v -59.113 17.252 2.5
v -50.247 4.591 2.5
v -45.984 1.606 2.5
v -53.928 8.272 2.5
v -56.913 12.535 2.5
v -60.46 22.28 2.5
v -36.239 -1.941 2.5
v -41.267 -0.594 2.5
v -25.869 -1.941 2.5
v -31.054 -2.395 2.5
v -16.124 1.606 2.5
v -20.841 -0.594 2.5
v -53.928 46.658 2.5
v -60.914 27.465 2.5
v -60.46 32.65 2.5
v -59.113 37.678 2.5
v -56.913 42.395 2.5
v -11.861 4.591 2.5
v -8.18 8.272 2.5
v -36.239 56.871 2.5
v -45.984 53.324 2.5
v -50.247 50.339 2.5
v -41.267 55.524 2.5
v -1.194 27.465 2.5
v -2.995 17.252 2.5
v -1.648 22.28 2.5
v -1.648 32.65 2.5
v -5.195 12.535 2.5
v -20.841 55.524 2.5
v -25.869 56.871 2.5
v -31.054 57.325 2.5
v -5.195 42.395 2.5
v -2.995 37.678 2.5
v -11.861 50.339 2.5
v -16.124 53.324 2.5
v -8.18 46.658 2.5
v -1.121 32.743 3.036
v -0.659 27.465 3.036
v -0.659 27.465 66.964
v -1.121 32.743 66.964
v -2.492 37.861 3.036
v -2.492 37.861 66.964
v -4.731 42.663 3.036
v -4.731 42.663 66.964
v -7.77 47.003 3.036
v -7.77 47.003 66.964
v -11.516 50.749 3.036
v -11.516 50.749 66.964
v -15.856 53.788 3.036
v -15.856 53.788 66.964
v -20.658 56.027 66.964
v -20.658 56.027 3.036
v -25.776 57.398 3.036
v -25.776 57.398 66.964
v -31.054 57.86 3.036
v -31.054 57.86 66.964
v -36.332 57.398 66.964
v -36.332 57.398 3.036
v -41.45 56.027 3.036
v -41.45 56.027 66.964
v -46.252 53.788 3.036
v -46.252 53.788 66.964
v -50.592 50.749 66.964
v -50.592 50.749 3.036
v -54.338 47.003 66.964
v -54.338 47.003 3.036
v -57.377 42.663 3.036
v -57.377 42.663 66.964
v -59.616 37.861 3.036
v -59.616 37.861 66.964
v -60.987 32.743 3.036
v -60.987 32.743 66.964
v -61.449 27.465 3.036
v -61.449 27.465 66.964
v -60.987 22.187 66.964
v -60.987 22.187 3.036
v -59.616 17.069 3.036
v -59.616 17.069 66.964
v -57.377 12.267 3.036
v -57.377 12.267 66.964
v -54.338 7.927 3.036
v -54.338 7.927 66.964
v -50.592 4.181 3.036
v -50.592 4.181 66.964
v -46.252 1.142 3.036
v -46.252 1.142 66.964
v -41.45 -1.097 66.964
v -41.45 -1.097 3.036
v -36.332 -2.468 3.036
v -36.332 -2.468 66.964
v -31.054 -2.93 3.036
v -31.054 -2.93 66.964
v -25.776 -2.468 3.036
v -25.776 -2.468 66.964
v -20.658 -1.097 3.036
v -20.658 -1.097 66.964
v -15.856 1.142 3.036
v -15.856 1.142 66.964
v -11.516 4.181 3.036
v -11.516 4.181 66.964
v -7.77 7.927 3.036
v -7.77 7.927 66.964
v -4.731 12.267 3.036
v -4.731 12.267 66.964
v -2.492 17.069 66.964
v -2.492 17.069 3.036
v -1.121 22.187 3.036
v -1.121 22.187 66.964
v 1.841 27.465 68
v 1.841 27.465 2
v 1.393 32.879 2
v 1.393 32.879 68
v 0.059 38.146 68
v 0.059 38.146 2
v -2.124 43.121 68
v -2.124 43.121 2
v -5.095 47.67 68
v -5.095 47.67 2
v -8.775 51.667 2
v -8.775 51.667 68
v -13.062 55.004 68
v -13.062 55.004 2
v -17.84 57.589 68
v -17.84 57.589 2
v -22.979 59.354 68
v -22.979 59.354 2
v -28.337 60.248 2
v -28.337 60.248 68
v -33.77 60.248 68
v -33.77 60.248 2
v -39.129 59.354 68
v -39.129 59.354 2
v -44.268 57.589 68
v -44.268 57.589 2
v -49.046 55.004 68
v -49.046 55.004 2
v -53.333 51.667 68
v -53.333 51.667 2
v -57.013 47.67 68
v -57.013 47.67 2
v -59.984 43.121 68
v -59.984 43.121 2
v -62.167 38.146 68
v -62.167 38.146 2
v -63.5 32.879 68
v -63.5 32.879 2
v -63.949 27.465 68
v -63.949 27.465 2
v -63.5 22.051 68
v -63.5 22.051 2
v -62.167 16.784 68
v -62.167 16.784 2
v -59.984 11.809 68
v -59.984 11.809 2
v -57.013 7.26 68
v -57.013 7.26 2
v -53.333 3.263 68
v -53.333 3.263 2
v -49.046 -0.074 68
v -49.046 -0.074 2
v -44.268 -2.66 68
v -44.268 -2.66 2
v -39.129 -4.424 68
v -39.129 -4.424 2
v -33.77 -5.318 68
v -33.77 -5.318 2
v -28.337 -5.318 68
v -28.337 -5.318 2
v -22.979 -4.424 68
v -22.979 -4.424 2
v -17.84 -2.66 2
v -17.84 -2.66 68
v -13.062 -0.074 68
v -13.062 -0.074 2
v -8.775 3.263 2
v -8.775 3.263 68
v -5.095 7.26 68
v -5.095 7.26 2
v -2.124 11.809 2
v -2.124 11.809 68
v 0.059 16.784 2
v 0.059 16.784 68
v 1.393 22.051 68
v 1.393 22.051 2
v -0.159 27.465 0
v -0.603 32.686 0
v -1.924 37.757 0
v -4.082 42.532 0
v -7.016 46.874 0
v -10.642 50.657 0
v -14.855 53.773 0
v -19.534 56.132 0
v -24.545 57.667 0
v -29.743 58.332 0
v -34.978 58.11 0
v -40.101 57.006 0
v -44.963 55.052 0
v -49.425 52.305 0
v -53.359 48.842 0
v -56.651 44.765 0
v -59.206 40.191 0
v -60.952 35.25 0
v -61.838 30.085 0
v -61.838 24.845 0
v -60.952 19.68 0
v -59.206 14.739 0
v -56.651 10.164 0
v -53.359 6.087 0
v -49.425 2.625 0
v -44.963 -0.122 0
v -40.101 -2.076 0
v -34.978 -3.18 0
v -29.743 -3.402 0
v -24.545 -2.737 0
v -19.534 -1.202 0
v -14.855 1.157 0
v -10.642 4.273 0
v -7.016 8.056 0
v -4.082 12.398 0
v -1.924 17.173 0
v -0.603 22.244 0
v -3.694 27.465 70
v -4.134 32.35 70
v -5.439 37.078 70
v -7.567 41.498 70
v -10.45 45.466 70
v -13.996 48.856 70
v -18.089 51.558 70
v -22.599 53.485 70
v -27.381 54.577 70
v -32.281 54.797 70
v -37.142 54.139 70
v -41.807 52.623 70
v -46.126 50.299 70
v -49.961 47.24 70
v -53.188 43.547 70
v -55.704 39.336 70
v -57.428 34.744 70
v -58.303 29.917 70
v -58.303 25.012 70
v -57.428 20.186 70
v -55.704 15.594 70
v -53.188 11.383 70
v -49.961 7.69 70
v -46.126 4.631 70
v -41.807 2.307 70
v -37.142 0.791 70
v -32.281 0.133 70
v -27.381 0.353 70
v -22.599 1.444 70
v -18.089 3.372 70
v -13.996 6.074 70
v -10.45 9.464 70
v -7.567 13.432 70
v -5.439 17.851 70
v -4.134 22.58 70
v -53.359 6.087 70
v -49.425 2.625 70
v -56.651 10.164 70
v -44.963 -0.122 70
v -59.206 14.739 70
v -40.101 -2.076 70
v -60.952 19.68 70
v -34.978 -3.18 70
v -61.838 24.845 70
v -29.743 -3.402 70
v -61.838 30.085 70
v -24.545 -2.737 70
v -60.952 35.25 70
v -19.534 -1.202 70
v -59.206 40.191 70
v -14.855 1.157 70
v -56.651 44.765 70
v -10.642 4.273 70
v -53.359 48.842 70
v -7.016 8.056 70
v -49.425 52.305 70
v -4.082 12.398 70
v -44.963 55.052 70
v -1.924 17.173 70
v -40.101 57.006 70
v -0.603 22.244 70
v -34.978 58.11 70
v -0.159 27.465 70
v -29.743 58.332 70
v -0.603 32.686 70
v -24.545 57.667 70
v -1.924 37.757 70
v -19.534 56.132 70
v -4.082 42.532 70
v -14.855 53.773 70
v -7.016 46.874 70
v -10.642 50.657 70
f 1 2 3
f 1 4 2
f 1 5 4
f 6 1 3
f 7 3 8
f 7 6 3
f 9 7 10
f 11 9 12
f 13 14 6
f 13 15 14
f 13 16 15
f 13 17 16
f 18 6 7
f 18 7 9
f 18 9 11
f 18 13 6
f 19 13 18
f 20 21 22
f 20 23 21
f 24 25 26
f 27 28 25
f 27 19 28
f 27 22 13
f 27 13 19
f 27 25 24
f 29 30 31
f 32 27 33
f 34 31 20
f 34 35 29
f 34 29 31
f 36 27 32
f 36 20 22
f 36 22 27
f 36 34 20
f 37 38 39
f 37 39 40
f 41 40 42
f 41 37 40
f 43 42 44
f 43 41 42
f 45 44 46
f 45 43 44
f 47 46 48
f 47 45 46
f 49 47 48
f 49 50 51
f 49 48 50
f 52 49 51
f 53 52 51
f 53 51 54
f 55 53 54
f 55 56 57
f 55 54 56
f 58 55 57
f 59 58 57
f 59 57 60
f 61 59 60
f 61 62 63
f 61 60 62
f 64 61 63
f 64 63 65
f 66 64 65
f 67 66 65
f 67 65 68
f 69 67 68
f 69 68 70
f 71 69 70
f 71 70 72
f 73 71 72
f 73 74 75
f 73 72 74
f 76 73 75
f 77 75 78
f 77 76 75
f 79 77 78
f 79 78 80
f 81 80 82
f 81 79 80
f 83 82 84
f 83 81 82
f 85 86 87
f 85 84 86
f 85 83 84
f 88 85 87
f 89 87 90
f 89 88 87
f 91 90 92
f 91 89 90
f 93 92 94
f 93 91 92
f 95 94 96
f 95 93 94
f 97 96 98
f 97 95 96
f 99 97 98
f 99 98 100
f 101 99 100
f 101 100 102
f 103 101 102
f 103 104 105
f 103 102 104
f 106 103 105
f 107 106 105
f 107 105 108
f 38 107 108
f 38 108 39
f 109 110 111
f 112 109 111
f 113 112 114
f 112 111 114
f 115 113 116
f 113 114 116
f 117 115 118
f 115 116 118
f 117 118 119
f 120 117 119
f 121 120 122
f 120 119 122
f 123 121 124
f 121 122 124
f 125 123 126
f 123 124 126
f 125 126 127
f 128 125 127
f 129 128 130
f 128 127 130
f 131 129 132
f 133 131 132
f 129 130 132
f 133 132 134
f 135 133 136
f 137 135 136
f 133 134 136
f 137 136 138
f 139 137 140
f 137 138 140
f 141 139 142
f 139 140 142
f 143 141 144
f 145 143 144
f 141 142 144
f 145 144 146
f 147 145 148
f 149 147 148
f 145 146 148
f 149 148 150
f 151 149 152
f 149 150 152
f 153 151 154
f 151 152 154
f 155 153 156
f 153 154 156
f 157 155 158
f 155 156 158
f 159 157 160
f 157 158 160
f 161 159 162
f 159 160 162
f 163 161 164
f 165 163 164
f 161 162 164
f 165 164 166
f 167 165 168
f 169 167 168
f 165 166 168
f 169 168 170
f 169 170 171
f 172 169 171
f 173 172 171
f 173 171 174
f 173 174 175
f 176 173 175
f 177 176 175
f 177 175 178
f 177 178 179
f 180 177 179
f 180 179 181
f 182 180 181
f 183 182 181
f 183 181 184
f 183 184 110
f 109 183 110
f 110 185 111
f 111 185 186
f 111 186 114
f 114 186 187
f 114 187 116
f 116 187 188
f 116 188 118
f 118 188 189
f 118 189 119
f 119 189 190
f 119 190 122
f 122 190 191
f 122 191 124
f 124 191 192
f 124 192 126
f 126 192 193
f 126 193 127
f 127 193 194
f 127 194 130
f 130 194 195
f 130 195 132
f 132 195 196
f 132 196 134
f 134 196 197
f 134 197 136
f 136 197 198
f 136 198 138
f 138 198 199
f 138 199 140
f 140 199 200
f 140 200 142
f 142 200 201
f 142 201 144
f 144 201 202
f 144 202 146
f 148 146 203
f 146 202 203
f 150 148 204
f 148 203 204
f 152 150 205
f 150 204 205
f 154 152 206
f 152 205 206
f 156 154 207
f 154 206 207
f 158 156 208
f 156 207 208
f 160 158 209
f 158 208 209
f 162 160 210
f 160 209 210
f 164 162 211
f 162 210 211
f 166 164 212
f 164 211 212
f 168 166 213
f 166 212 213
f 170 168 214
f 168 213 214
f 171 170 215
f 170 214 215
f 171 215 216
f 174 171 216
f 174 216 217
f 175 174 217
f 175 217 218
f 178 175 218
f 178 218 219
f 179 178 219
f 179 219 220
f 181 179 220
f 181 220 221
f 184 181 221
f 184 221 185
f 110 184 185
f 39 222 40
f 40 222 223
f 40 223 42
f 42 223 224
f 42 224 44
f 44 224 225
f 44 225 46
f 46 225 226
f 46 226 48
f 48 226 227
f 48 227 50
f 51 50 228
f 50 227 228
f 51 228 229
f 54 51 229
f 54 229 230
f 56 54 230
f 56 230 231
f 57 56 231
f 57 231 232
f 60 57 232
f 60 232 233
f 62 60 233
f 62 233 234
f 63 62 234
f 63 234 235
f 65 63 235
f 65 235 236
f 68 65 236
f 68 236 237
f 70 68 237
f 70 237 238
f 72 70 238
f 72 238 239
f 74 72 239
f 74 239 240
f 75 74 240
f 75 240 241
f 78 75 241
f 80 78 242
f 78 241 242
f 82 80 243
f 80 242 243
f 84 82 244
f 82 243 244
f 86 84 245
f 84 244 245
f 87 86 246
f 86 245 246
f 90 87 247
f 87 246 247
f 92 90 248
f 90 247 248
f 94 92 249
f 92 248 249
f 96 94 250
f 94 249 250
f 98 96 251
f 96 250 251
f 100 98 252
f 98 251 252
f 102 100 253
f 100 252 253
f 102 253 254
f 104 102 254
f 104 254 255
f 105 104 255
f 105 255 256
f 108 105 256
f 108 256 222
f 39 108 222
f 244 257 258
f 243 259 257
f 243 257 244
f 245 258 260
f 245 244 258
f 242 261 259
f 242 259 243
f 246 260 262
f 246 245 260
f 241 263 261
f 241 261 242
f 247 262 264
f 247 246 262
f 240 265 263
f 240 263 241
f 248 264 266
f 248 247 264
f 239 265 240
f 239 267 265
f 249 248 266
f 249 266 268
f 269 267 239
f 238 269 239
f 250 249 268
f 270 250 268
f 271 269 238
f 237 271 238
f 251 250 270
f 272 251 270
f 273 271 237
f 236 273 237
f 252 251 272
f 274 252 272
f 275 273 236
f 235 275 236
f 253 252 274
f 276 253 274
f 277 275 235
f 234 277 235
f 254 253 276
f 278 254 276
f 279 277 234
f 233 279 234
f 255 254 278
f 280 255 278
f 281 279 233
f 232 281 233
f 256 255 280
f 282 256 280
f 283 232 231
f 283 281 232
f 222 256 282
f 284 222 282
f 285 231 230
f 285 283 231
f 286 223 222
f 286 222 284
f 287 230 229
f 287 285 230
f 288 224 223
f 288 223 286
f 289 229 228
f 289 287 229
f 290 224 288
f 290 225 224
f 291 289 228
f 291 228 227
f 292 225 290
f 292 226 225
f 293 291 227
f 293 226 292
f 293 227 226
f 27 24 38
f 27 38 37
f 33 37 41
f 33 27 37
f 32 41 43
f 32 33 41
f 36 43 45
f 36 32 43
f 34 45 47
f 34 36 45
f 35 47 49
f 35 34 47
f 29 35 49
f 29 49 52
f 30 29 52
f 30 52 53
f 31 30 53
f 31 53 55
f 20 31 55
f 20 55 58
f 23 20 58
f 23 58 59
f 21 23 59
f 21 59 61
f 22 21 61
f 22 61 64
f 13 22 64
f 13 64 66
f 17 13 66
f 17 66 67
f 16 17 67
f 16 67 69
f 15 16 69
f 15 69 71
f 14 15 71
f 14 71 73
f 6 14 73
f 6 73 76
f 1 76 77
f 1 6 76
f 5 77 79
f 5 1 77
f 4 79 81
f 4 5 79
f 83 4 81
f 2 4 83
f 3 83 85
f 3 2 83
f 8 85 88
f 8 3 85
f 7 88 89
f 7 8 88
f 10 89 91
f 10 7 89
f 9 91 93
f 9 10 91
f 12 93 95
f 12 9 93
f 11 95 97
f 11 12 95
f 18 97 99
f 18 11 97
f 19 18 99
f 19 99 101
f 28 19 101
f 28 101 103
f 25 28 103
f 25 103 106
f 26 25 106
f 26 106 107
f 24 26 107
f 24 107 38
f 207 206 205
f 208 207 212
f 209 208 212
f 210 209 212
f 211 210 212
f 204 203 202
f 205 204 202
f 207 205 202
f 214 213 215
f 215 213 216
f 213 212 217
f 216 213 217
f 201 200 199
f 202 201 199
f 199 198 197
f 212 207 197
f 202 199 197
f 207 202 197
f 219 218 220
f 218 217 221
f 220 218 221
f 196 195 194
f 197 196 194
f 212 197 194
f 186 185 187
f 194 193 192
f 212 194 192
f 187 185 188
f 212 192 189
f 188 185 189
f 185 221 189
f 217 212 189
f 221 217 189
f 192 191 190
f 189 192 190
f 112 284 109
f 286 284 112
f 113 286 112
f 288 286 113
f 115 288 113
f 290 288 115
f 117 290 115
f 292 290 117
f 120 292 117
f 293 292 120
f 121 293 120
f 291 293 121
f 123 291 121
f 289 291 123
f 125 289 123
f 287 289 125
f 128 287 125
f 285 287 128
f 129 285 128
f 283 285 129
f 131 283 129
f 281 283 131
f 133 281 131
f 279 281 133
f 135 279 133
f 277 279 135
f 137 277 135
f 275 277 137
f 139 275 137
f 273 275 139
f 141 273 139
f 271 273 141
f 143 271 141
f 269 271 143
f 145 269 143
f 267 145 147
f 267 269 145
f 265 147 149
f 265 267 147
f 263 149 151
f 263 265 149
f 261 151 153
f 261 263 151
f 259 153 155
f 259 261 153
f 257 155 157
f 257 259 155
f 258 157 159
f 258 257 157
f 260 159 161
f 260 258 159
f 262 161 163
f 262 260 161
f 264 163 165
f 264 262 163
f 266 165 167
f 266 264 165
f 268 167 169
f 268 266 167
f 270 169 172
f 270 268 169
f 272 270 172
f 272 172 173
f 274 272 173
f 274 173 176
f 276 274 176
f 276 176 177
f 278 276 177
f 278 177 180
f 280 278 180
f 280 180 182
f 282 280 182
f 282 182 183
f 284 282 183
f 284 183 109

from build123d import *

# Parameters (mm, degrees)
F0_R     = 32.895129
F1_DEPTH = 70
F2_SIZE  = 2
F3_SIZE  = 2
F4_T     = -2.5


with BuildPart() as f1:
    # F0 (on Top) → F1 (new body)
    with BuildSketch(Plane.XY):
        with Locations((-31.053945, 27.464956)):
            Circle(F0_R)
    extrude(amount=F1_DEPTH)

    # F2
    f2_edges = [f1.edges().sort_by_distance(p)[0] for p in [
        (-63.949075, 27.464956, 70),
    ]]
    chamfer(f2_edges, length=F2_SIZE)

    # F3
    f3_edges = [f1.edges().sort_by_distance(p)[0] for p in [
        (-63.949075, 27.464956, 0),
    ]]
    chamfer(f3_edges, length=F3_SIZE)

    # F4
    f4_openings = [f1.faces().sort_by_distance(p)[0] for p in [
        (-31.053945, 27.464956, 70),
    ]]
    offset(amount=F4_T, openings=f4_openings)


solid = f1.part
